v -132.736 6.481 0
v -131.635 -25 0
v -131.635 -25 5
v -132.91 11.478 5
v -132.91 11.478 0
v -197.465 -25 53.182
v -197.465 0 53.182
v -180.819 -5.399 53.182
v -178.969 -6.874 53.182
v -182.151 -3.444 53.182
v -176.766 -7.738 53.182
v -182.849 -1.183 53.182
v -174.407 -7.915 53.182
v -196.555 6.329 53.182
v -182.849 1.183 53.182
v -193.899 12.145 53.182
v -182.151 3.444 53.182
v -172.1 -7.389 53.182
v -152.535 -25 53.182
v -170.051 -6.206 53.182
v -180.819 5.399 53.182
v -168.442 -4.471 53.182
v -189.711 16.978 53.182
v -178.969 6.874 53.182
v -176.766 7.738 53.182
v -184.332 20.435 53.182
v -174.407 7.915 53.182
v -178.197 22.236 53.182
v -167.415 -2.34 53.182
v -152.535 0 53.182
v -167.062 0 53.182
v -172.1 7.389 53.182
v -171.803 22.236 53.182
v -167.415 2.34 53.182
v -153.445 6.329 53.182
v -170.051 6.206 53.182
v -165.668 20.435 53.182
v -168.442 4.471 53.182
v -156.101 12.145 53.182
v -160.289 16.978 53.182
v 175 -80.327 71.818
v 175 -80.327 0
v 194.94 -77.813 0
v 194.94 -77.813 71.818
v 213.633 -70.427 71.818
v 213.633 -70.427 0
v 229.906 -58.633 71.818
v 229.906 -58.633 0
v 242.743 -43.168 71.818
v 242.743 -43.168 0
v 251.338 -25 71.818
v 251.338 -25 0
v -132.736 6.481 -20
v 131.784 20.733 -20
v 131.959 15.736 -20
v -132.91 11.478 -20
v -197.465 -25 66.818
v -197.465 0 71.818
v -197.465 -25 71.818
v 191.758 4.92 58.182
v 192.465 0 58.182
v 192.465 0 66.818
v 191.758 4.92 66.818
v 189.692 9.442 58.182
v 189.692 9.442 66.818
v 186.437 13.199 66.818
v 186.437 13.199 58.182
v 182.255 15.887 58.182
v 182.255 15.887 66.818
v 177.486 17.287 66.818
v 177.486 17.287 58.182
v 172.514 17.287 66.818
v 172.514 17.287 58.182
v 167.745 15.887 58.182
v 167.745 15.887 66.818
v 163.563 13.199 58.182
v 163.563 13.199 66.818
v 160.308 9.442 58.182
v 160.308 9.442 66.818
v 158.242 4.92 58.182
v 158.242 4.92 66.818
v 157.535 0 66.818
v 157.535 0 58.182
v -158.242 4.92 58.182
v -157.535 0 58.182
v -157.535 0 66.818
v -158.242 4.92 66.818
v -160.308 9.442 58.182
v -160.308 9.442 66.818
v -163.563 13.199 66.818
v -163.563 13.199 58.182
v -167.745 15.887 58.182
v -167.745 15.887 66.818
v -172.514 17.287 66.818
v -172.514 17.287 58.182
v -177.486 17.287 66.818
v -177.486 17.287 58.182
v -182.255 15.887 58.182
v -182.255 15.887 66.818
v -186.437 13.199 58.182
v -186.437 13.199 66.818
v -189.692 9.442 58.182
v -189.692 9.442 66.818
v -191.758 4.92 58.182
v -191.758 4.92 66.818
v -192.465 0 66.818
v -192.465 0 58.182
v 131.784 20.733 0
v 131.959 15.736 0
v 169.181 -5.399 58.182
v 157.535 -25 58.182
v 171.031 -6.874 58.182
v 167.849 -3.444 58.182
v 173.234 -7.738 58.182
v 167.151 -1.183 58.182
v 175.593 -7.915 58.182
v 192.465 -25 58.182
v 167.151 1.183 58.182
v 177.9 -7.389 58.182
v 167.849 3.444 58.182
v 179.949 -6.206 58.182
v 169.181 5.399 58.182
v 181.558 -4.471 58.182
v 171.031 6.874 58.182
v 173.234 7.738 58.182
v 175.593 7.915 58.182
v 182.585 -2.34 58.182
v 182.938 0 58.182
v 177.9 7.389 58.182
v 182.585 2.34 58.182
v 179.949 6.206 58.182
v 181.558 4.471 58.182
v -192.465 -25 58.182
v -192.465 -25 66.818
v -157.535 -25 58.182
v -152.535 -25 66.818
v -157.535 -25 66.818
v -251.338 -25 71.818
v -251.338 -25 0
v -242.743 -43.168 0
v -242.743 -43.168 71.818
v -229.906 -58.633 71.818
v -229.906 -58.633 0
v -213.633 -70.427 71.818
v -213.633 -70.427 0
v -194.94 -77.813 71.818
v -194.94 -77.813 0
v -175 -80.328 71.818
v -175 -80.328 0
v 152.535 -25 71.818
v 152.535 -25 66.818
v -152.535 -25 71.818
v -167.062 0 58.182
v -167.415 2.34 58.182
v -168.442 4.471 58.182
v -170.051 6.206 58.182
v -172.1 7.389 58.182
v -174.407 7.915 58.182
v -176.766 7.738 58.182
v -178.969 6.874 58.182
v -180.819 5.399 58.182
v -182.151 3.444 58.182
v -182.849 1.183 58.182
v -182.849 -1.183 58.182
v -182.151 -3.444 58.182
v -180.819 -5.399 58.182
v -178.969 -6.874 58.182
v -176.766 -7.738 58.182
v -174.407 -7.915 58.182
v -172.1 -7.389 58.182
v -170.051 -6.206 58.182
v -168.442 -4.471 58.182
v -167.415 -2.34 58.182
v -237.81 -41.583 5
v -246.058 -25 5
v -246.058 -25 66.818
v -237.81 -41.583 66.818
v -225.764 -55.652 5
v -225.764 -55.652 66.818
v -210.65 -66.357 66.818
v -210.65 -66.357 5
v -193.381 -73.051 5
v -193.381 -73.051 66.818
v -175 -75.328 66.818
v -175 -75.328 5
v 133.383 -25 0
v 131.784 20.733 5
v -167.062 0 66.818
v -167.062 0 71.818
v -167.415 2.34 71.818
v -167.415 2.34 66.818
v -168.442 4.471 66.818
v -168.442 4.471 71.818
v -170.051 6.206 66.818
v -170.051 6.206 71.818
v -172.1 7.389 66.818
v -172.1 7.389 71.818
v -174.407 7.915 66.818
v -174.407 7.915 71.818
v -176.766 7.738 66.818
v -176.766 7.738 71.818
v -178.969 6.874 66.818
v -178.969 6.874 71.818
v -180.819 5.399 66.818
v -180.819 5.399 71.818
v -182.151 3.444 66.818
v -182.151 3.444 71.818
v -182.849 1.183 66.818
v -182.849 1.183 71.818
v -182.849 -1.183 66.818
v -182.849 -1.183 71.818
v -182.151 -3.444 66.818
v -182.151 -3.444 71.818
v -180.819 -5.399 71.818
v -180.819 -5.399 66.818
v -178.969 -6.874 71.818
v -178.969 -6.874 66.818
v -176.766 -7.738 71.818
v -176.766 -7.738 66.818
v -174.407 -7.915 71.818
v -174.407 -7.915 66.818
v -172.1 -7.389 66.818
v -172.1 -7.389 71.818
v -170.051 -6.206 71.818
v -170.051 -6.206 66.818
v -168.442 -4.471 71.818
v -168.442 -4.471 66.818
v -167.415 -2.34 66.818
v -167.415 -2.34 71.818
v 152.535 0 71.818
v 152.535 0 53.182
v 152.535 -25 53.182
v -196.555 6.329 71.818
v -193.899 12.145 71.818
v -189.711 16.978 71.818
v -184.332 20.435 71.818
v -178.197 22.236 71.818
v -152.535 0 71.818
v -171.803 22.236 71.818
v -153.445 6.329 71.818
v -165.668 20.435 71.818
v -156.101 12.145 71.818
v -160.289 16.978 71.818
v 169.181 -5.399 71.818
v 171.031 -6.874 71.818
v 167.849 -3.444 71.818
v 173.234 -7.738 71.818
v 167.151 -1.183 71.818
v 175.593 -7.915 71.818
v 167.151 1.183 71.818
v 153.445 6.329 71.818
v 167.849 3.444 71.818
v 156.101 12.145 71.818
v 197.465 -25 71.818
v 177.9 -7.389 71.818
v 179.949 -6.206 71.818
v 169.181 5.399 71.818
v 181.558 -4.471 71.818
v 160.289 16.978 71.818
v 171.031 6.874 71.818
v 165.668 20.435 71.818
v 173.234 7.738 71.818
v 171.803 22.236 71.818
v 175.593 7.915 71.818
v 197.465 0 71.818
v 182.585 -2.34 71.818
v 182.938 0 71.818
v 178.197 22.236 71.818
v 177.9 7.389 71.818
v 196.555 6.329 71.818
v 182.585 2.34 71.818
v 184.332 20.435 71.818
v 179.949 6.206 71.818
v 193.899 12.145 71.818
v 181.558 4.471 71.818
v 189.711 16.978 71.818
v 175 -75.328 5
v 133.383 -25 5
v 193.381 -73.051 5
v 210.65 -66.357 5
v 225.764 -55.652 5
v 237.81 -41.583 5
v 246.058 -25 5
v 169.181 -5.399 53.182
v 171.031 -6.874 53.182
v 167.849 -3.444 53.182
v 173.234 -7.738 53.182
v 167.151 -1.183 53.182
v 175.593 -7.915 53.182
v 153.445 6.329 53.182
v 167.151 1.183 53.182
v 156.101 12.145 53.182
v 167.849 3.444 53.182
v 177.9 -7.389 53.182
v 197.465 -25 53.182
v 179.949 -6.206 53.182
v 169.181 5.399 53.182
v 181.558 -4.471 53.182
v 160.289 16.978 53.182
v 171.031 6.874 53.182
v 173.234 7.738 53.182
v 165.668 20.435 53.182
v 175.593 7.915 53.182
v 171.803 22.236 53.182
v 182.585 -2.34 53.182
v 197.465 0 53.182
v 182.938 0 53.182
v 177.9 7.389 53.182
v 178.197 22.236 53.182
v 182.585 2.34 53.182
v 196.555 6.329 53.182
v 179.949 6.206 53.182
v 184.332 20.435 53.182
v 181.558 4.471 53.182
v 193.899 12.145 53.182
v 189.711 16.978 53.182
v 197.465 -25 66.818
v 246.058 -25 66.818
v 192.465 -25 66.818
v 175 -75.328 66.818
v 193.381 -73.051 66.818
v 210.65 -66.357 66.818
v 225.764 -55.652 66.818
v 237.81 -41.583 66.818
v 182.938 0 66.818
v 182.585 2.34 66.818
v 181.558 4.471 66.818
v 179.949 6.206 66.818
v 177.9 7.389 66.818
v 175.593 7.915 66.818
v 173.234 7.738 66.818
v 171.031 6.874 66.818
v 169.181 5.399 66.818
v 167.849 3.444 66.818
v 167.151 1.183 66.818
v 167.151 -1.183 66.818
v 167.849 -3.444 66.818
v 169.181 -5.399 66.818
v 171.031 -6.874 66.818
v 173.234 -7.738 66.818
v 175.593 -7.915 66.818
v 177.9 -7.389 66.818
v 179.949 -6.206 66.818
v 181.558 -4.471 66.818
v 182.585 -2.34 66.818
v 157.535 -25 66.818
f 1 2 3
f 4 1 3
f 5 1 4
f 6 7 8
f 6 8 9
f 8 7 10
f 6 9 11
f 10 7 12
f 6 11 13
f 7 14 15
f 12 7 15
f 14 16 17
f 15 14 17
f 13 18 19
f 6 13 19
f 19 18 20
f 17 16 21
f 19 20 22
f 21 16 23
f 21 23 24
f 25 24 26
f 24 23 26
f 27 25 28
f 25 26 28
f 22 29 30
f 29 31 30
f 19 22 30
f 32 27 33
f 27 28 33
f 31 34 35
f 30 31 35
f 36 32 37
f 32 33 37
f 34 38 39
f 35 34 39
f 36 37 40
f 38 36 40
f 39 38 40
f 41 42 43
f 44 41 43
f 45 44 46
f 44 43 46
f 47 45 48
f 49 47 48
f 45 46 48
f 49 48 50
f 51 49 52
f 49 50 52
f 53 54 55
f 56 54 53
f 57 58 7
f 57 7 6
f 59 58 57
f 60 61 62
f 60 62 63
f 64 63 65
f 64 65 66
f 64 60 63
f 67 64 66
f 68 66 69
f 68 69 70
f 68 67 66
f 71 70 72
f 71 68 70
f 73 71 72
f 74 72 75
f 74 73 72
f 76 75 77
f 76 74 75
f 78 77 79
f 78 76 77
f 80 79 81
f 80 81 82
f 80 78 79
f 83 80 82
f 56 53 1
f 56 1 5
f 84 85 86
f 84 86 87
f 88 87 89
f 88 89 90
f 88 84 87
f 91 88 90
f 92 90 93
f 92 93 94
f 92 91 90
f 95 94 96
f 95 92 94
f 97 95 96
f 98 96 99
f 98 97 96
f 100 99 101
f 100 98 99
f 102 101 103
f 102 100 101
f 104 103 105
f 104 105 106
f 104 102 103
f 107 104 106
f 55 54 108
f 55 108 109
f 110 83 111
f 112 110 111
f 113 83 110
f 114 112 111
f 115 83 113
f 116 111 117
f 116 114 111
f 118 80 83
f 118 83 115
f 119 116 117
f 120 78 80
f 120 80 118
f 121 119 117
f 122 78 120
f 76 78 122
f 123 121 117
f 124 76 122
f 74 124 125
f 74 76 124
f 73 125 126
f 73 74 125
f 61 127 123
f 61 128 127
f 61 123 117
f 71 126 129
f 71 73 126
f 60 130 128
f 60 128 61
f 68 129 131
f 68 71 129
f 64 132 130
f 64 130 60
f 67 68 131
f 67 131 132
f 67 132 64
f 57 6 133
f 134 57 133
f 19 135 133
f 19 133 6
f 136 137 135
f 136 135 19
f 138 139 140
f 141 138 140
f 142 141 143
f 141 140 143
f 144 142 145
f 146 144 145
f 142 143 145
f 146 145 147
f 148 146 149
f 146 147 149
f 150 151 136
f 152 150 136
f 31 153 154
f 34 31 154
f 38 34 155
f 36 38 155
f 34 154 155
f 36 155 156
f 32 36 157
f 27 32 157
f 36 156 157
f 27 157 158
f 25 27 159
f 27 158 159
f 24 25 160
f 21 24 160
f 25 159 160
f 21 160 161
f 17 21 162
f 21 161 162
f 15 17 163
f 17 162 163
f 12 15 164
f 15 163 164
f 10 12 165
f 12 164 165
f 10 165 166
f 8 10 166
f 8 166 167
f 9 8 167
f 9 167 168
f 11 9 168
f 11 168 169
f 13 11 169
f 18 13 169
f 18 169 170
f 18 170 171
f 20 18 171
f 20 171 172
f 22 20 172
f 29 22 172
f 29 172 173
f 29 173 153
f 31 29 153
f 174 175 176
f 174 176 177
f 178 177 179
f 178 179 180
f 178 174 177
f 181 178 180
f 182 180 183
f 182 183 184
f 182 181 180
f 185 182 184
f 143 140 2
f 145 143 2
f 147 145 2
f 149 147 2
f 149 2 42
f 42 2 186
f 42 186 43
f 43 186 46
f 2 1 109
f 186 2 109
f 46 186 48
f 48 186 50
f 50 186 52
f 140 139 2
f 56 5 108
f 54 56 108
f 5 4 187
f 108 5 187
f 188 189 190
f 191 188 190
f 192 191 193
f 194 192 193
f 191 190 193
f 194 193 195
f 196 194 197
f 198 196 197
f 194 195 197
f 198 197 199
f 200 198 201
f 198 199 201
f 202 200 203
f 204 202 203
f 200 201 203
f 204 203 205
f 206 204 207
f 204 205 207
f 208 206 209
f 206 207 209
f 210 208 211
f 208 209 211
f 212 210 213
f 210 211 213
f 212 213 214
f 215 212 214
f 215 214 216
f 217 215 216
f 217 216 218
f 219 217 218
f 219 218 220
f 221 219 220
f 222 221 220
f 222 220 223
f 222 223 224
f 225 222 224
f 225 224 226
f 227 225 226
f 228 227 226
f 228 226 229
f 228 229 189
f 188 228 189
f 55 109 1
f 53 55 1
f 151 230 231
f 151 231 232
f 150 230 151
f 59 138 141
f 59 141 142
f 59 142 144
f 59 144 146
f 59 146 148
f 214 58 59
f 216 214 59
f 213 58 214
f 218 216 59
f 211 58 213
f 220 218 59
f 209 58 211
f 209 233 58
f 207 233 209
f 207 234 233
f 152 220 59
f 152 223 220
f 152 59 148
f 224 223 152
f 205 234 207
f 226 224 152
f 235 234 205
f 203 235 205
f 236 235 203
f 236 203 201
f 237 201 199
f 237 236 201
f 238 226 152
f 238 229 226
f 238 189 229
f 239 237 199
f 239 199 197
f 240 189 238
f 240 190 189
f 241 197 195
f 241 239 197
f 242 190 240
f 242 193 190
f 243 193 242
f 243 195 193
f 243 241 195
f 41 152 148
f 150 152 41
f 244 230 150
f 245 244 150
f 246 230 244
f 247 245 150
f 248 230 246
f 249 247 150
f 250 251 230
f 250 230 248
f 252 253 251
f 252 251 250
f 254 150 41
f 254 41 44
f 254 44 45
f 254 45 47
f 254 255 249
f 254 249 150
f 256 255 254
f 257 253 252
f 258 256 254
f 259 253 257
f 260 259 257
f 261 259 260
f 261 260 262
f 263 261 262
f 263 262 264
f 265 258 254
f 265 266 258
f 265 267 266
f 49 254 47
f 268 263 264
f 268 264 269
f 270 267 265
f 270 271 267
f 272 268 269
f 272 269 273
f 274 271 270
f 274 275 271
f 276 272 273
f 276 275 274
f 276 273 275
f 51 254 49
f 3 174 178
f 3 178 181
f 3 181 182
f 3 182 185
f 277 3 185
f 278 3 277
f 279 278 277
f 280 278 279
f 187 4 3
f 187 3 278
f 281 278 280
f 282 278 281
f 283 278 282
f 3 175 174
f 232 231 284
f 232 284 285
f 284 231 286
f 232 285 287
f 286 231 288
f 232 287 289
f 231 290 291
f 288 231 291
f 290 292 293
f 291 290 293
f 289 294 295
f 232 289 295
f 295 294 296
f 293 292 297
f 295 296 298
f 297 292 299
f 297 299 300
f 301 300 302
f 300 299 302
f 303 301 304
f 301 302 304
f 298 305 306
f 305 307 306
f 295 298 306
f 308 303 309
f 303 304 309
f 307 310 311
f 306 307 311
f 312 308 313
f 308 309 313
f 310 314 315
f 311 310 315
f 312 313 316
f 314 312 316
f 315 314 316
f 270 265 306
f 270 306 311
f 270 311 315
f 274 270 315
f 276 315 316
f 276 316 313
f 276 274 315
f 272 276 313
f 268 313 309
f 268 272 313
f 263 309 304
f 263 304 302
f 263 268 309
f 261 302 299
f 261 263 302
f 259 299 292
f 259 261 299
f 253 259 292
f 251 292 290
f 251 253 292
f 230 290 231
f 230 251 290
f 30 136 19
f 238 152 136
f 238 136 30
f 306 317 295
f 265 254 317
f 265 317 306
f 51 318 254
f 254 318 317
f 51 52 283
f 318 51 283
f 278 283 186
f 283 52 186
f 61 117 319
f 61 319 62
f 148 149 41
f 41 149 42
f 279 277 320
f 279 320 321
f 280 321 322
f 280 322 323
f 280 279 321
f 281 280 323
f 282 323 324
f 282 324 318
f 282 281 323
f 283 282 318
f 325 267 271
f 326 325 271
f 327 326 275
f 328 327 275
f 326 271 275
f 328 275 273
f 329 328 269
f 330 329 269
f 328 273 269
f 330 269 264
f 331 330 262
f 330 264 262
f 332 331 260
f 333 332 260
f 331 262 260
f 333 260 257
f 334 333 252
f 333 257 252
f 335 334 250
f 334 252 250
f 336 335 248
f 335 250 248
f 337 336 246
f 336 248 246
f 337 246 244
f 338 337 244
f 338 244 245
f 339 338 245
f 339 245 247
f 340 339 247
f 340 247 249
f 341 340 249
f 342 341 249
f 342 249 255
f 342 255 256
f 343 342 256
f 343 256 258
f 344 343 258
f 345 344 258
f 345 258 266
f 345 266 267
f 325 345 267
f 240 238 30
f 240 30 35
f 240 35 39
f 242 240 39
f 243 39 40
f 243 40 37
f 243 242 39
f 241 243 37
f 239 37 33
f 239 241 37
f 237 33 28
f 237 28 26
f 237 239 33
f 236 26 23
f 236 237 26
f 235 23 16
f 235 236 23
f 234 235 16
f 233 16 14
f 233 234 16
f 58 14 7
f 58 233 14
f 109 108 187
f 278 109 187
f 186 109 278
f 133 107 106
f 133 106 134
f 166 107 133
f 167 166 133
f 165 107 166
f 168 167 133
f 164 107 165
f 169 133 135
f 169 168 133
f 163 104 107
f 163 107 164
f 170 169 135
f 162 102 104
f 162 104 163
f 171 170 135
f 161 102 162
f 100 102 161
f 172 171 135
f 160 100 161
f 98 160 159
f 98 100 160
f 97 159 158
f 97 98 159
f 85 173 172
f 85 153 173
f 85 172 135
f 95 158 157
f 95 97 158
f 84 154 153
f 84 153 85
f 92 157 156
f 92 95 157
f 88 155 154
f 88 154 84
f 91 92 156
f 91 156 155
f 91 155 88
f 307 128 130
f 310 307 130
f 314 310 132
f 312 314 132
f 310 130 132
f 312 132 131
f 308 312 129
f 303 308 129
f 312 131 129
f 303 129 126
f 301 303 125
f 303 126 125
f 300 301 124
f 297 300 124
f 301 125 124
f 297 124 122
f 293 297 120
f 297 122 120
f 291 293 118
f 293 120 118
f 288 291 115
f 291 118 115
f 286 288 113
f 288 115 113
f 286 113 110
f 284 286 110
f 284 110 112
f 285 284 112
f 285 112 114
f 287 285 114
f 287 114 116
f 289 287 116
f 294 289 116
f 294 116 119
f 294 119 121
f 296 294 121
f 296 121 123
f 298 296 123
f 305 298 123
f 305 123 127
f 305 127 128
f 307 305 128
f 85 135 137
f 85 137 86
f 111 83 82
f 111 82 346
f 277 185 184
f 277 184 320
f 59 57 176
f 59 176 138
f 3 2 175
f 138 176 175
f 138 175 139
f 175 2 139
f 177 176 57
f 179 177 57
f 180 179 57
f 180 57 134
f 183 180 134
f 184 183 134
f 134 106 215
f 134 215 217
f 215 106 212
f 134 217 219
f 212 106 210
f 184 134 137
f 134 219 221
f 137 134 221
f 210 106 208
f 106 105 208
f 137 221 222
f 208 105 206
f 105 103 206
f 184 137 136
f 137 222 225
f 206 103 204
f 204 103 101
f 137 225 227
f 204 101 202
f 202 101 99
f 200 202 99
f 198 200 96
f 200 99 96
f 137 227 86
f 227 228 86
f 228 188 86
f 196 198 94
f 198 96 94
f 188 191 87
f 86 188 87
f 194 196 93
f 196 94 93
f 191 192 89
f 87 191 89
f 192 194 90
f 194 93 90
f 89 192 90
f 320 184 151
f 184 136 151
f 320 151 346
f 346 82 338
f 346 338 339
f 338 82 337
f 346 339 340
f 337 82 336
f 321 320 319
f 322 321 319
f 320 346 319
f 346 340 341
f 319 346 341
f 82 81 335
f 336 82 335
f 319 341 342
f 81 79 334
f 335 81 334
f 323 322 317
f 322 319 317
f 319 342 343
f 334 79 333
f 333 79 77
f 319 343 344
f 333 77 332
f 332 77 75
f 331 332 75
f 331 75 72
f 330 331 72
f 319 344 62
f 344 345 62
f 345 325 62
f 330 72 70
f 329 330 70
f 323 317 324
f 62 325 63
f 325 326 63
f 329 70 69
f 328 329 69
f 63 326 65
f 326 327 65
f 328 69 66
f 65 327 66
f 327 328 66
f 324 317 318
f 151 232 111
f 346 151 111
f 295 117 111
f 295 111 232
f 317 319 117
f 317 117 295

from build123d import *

# Parameters (mm, degrees)
BOSS_EXTRUDE7_DEPTH = 71.818
SHELL8_START        = 5
SHELL8_DEPTH        = 61.818
BOSS_EXTRUDE4_DEPTH = 18.636
SHELL7_START        = 58.182
SHELL7_DEPTH        = 8.636
SKETCH5_R           = 7.9375
CUT_EXTRUDE1_DEPTH  = 274.461475598
BOSS_EXTRUDE5_DEPTH = 5
BOSS_EXTRUDE6_DEPTH = 20


# Read off the part's stored shape, not the designer's step: Shell8, Shell7
with BuildPart() as part:
    # Sketch3 → Boss-Extrude7 (new body)
    with BuildSketch(Plane.XY):
        with BuildLine():
            ThreePointArc((-251.338111427, -25), (-222.139790815, -65.041120671), (-175, -80.3275))
            Line((-175, -80.3275), (175, -80.3275))
            ThreePointArc((175, -80.3275), (222.139790815, -65.041120671), (251.338111427, -25))
            Line((251.338111427, -25), (-251.338111427, -25))
        make_face()
    extrude(amount=BOSS_EXTRUDE7_DEPTH)

    # Shell8 outline → Shell8 (cut)
    with BuildSketch(Plane.XY.offset(SHELL8_START)):
        with BuildLine():
            ThreePointArc((-246.057949986, -25), (-218.537597294, -61.471211783), (-175, -75.3275))
            Line((-175, -75.3275), (175, -75.3275))
            ThreePointArc((175, -75.3275), (218.537597294, -61.471211783), (246.057949986, -25))
            Line((246.057949986, -25), (-246.057949986, -25))
        make_face()
    extrude(amount=SHELL8_DEPTH, mode=Mode.SUBTRACT)

    # Sketch4 → Boss-Extrude4 (add)
    with BuildSketch(Plane.XY.offset(71.818)):
        with BuildLine():
            Line((152.535, -25), (197.465, -25))
            Line((197.465, -25), (197.465, 0))
            ThreePointArc((197.465, 0), (175, 22.465), (152.535, 0))
            Line((152.535, 0), (152.535, -25))
        make_face()
        with BuildLine():
            Line((-197.465, 0), (-197.465, -25))
            Line((-197.465, -25), (-152.535, -25))
            Line((-152.535, -25), (-152.535, 0))
            ThreePointArc((-152.535, 0), (-175, 22.465), (-197.465, 0))
        make_face()
    extrude(amount=-BOSS_EXTRUDE4_DEPTH)

    # Shell7 outline → Shell7 (cut)
    with BuildSketch(Plane.XY.offset(SHELL7_START)):
        with BuildLine():
            Line((192.465, -25), (192.465, 0))
            ThreePointArc((192.465, 0), (175, 17.465), (157.535, 0))
            Line((157.535, 0), (157.535, -25))
            Line((157.535, -25), (192.465, -25))
        make_face()
        with BuildLine():
            ThreePointArc((-157.535, 0), (-175, 17.465), (-192.465, 0))
            Line((-192.465, 0), (-192.465, -25))
            Line((-192.465, -25), (-157.535, -25))
            Line((-157.535, -25), (-157.535, 0))
        make_face()
    extrude(amount=SHELL7_DEPTH, mode=Mode.SUBTRACT)

    # Sketch5 → Cut-Extrude1 (cut, through all)
    with BuildSketch(Plane.XY.offset(71.818)):
        with Locations((175, 0)):
            Circle(SKETCH5_R)
        with Locations((-175, 0)):
            Circle(SKETCH5_R)
    extrude(amount=-CUT_EXTRUDE1_DEPTH, mode=Mode.SUBTRACT)

    # Sketch13 → Boss-Extrude5 (add)
    with BuildSketch(Plane(origin=(0, 0, 0), x_dir=(-1, 0, 0), z_dir=(0, 0, -1))):
        Polygon((131.634946049, -25), (132.910361442, 11.477741548), (-131.784153156, 20.732575975), (-133.383156517, -25), align=None)
    extrude(amount=-BOSS_EXTRUDE5_DEPTH)

    # Sketch14 → Boss-Extrude6 (add)
    with BuildSketch(Plane(origin=(0, 0, 0), x_dir=(-1, 0, 0), z_dir=(0, 0, -1))):
        Polygon((-131.784153156, 20.732575975), (-131.958867442, 15.735629415), (132.735647156, 6.480794988), (132.910361442, 11.477741548), align=None)
    extrude(amount=BOSS_EXTRUDE6_DEPTH)


solid = part.part
